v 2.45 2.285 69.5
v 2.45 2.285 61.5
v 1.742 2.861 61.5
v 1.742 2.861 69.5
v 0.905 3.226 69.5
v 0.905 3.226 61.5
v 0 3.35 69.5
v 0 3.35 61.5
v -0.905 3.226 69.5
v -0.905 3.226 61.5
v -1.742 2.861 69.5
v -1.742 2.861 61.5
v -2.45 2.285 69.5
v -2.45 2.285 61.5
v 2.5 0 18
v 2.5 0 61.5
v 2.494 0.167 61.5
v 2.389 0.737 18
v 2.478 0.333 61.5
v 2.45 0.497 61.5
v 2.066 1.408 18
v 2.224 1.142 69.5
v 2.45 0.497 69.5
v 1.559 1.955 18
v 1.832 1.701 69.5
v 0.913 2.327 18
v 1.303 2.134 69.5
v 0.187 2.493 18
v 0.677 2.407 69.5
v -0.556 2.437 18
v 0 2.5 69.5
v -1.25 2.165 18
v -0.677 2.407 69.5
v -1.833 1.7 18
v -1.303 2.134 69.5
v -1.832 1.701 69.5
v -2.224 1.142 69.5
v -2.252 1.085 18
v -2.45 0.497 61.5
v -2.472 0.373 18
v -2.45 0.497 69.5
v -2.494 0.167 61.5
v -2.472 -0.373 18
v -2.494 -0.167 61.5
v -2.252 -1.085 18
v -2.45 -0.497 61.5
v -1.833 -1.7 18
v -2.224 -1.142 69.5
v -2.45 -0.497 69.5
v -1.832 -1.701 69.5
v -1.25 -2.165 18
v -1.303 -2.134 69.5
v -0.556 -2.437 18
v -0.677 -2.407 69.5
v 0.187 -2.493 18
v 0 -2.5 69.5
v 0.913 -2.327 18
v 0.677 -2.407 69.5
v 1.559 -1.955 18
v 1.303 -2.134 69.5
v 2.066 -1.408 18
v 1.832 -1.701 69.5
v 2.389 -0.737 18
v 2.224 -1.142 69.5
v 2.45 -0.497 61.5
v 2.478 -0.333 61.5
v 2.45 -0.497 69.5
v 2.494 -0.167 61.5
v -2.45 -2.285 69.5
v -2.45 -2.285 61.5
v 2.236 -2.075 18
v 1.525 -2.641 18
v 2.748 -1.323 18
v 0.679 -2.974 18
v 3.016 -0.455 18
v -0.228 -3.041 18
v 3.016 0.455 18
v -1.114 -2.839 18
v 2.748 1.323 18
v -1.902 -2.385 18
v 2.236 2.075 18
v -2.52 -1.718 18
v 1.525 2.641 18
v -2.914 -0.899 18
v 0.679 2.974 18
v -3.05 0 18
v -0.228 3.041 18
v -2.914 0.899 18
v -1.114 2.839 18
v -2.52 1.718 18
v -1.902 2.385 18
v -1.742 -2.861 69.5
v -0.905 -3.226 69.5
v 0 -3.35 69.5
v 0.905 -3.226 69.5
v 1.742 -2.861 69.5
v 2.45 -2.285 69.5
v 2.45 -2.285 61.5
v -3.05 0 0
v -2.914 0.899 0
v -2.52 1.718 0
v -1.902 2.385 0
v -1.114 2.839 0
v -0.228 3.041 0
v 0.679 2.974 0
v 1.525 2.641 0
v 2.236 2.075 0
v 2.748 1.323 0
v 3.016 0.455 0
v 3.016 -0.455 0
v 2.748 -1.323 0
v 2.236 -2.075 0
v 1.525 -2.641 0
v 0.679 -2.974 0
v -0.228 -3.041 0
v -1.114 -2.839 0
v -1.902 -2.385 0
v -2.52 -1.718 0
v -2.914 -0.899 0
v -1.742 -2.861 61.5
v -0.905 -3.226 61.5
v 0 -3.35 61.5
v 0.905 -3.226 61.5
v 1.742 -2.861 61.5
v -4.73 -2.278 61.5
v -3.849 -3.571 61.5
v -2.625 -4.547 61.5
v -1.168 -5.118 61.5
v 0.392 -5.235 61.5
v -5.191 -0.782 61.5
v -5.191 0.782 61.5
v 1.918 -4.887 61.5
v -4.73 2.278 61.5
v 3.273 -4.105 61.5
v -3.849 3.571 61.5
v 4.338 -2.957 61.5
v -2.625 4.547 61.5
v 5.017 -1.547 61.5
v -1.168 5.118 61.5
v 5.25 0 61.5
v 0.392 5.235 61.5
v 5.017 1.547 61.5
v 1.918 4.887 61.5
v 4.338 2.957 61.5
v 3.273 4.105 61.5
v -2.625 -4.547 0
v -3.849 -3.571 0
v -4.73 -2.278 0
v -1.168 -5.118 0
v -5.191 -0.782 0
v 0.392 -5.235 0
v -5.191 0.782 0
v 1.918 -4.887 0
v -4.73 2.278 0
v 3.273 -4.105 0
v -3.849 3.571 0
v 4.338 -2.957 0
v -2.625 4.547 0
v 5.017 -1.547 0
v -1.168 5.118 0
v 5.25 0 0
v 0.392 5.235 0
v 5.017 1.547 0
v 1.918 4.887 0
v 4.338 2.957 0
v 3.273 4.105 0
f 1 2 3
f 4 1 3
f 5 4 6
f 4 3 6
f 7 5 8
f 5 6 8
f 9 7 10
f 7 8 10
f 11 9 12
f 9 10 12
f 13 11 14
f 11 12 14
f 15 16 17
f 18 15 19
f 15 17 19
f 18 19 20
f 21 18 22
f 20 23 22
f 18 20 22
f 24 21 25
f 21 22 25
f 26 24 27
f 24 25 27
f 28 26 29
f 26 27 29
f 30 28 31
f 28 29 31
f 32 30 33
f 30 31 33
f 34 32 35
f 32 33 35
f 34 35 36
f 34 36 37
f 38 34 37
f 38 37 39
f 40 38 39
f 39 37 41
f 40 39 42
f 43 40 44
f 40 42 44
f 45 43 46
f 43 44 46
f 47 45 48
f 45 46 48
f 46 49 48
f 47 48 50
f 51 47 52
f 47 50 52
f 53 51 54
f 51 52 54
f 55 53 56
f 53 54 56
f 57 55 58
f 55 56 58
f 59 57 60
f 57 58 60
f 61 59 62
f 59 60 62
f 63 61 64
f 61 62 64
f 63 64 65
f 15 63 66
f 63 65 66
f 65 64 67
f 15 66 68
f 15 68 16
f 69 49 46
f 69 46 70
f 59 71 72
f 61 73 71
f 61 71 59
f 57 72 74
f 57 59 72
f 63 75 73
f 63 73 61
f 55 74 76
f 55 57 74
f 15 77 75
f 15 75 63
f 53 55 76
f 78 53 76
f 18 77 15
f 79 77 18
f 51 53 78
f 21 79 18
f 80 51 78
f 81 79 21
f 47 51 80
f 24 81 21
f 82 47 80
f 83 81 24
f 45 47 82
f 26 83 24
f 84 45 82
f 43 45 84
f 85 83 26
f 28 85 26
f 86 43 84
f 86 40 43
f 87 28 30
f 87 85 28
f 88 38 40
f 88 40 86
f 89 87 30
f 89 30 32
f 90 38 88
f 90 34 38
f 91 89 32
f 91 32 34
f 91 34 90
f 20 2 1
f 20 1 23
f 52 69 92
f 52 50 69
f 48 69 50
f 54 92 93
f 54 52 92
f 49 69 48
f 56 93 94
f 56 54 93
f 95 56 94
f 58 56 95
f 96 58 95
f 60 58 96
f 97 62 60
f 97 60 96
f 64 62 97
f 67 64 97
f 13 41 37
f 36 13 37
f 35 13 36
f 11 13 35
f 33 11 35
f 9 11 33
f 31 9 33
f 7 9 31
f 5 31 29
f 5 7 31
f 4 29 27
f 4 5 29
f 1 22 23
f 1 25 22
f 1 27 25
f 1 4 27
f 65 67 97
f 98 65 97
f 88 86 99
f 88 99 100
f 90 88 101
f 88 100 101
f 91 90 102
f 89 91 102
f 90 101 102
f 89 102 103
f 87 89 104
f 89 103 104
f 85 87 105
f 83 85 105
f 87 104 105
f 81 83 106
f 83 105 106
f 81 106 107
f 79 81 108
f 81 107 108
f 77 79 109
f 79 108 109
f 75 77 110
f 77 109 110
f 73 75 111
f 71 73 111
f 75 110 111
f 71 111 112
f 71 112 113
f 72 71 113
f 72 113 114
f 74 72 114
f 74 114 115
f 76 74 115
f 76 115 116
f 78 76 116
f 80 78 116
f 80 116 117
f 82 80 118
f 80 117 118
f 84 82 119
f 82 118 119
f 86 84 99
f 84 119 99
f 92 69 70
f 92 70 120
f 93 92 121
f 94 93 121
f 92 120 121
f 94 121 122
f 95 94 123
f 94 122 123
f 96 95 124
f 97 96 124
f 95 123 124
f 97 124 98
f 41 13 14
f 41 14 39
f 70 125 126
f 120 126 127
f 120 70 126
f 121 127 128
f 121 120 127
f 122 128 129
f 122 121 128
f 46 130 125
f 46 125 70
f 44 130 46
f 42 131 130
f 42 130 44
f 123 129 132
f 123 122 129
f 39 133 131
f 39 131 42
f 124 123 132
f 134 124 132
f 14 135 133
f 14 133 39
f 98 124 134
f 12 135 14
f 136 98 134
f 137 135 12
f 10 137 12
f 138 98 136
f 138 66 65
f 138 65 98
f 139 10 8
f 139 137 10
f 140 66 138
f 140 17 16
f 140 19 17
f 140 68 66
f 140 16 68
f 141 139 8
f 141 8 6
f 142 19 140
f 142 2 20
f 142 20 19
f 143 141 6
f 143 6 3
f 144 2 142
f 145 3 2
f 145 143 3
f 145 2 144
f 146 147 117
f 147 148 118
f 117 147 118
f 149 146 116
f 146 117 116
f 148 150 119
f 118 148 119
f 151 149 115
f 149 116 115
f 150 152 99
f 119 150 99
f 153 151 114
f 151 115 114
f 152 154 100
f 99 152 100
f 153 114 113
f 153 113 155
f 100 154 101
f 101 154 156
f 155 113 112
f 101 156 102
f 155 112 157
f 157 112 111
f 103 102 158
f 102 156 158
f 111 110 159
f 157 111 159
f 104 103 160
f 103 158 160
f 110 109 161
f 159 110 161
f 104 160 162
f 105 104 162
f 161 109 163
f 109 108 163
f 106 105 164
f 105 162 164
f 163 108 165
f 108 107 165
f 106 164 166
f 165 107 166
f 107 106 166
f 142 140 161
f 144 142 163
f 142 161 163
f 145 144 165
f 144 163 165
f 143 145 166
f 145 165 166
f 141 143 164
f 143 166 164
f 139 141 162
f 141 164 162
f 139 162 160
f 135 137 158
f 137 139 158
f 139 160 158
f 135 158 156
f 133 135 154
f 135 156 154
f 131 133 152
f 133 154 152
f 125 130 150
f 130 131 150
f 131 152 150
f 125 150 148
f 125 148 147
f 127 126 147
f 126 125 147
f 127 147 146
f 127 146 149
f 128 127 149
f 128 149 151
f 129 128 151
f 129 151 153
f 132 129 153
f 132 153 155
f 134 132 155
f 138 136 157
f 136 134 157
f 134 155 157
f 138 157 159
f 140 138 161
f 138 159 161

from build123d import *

# Parameters (mm, degrees)
SZKIC1_R                    = 5.25
DODANIE_WYCI_GNI_CIE1_DEPTH = 61.5
SZKIC3_R                    = 3.35
DODANIE_WYCI_GNI_CIE2_DEPTH = 8
SZKIC4_R                    = 2.5
WYTNIJ_WYCI_GNI_CIE2_DEPTH  = 70.5
SZKIC7_R                    = 3.05
WYTNIJ_WYCI_GNI_CIE4_DEPTH  = 18
WYTNIJ_WYCI_GNI_CIE8_DEPTH  = 8


with BuildPart() as part:
    # Szkic1 → Dodanie-wyciągnięcie1 (new body)
    with BuildSketch(Plane.XY):
        Circle(SZKIC1_R)
    extrude(amount=DODANIE_WYCI_GNI_CIE1_DEPTH)

    # Szkic3 → Dodanie-wyciągnięcie2 (add)
    with BuildSketch(Plane.XY.offset(61.5)):
        Circle(SZKIC3_R)
    extrude(amount=DODANIE_WYCI_GNI_CIE2_DEPTH)

    # Szkic4 → Wytnij-wyciągnięcie2 (cut, through all)
    with BuildSketch(Plane.XY.offset(69.5)):
        Circle(SZKIC4_R)
    extrude(amount=-WYTNIJ_WYCI_GNI_CIE2_DEPTH, mode=Mode.SUBTRACT)

    # Szkic7 → Wytnij-wyciągnięcie4 (cut)
    with BuildSketch(Plane(origin=(0, 0, 0), x_dir=(-1, 0, 0), z_dir=(0, 0, -1))):
        Circle(SZKIC7_R)
    extrude(amount=-WYTNIJ_WYCI_GNI_CIE4_DEPTH, mode=Mode.SUBTRACT)

    # Szkic10 → Wytnij-wyciągnięcie8 (cut)
    with BuildSketch(Plane.XY.offset(69.5)):
        Polygon((-2.5, 4.616546328), (-2.45, 4.616546328), (-2.45, -4.155907231), (-2.5, -4.155907231), (-5.821141217, -4.155907231), (-5.821141217, 4.616546328), align=None)
        Polygon((2.5, 4.616546328), (2.45, 4.616546328), (2.45, -4.055418973), (2.5, -4.055418973), (5.892918543, -4.155907231), (5.892918543, 4.616546328), align=None)
    extrude(amount=-WYTNIJ_WYCI_GNI_CIE8_DEPTH, mode=Mode.SUBTRACT)


solid = part.part
